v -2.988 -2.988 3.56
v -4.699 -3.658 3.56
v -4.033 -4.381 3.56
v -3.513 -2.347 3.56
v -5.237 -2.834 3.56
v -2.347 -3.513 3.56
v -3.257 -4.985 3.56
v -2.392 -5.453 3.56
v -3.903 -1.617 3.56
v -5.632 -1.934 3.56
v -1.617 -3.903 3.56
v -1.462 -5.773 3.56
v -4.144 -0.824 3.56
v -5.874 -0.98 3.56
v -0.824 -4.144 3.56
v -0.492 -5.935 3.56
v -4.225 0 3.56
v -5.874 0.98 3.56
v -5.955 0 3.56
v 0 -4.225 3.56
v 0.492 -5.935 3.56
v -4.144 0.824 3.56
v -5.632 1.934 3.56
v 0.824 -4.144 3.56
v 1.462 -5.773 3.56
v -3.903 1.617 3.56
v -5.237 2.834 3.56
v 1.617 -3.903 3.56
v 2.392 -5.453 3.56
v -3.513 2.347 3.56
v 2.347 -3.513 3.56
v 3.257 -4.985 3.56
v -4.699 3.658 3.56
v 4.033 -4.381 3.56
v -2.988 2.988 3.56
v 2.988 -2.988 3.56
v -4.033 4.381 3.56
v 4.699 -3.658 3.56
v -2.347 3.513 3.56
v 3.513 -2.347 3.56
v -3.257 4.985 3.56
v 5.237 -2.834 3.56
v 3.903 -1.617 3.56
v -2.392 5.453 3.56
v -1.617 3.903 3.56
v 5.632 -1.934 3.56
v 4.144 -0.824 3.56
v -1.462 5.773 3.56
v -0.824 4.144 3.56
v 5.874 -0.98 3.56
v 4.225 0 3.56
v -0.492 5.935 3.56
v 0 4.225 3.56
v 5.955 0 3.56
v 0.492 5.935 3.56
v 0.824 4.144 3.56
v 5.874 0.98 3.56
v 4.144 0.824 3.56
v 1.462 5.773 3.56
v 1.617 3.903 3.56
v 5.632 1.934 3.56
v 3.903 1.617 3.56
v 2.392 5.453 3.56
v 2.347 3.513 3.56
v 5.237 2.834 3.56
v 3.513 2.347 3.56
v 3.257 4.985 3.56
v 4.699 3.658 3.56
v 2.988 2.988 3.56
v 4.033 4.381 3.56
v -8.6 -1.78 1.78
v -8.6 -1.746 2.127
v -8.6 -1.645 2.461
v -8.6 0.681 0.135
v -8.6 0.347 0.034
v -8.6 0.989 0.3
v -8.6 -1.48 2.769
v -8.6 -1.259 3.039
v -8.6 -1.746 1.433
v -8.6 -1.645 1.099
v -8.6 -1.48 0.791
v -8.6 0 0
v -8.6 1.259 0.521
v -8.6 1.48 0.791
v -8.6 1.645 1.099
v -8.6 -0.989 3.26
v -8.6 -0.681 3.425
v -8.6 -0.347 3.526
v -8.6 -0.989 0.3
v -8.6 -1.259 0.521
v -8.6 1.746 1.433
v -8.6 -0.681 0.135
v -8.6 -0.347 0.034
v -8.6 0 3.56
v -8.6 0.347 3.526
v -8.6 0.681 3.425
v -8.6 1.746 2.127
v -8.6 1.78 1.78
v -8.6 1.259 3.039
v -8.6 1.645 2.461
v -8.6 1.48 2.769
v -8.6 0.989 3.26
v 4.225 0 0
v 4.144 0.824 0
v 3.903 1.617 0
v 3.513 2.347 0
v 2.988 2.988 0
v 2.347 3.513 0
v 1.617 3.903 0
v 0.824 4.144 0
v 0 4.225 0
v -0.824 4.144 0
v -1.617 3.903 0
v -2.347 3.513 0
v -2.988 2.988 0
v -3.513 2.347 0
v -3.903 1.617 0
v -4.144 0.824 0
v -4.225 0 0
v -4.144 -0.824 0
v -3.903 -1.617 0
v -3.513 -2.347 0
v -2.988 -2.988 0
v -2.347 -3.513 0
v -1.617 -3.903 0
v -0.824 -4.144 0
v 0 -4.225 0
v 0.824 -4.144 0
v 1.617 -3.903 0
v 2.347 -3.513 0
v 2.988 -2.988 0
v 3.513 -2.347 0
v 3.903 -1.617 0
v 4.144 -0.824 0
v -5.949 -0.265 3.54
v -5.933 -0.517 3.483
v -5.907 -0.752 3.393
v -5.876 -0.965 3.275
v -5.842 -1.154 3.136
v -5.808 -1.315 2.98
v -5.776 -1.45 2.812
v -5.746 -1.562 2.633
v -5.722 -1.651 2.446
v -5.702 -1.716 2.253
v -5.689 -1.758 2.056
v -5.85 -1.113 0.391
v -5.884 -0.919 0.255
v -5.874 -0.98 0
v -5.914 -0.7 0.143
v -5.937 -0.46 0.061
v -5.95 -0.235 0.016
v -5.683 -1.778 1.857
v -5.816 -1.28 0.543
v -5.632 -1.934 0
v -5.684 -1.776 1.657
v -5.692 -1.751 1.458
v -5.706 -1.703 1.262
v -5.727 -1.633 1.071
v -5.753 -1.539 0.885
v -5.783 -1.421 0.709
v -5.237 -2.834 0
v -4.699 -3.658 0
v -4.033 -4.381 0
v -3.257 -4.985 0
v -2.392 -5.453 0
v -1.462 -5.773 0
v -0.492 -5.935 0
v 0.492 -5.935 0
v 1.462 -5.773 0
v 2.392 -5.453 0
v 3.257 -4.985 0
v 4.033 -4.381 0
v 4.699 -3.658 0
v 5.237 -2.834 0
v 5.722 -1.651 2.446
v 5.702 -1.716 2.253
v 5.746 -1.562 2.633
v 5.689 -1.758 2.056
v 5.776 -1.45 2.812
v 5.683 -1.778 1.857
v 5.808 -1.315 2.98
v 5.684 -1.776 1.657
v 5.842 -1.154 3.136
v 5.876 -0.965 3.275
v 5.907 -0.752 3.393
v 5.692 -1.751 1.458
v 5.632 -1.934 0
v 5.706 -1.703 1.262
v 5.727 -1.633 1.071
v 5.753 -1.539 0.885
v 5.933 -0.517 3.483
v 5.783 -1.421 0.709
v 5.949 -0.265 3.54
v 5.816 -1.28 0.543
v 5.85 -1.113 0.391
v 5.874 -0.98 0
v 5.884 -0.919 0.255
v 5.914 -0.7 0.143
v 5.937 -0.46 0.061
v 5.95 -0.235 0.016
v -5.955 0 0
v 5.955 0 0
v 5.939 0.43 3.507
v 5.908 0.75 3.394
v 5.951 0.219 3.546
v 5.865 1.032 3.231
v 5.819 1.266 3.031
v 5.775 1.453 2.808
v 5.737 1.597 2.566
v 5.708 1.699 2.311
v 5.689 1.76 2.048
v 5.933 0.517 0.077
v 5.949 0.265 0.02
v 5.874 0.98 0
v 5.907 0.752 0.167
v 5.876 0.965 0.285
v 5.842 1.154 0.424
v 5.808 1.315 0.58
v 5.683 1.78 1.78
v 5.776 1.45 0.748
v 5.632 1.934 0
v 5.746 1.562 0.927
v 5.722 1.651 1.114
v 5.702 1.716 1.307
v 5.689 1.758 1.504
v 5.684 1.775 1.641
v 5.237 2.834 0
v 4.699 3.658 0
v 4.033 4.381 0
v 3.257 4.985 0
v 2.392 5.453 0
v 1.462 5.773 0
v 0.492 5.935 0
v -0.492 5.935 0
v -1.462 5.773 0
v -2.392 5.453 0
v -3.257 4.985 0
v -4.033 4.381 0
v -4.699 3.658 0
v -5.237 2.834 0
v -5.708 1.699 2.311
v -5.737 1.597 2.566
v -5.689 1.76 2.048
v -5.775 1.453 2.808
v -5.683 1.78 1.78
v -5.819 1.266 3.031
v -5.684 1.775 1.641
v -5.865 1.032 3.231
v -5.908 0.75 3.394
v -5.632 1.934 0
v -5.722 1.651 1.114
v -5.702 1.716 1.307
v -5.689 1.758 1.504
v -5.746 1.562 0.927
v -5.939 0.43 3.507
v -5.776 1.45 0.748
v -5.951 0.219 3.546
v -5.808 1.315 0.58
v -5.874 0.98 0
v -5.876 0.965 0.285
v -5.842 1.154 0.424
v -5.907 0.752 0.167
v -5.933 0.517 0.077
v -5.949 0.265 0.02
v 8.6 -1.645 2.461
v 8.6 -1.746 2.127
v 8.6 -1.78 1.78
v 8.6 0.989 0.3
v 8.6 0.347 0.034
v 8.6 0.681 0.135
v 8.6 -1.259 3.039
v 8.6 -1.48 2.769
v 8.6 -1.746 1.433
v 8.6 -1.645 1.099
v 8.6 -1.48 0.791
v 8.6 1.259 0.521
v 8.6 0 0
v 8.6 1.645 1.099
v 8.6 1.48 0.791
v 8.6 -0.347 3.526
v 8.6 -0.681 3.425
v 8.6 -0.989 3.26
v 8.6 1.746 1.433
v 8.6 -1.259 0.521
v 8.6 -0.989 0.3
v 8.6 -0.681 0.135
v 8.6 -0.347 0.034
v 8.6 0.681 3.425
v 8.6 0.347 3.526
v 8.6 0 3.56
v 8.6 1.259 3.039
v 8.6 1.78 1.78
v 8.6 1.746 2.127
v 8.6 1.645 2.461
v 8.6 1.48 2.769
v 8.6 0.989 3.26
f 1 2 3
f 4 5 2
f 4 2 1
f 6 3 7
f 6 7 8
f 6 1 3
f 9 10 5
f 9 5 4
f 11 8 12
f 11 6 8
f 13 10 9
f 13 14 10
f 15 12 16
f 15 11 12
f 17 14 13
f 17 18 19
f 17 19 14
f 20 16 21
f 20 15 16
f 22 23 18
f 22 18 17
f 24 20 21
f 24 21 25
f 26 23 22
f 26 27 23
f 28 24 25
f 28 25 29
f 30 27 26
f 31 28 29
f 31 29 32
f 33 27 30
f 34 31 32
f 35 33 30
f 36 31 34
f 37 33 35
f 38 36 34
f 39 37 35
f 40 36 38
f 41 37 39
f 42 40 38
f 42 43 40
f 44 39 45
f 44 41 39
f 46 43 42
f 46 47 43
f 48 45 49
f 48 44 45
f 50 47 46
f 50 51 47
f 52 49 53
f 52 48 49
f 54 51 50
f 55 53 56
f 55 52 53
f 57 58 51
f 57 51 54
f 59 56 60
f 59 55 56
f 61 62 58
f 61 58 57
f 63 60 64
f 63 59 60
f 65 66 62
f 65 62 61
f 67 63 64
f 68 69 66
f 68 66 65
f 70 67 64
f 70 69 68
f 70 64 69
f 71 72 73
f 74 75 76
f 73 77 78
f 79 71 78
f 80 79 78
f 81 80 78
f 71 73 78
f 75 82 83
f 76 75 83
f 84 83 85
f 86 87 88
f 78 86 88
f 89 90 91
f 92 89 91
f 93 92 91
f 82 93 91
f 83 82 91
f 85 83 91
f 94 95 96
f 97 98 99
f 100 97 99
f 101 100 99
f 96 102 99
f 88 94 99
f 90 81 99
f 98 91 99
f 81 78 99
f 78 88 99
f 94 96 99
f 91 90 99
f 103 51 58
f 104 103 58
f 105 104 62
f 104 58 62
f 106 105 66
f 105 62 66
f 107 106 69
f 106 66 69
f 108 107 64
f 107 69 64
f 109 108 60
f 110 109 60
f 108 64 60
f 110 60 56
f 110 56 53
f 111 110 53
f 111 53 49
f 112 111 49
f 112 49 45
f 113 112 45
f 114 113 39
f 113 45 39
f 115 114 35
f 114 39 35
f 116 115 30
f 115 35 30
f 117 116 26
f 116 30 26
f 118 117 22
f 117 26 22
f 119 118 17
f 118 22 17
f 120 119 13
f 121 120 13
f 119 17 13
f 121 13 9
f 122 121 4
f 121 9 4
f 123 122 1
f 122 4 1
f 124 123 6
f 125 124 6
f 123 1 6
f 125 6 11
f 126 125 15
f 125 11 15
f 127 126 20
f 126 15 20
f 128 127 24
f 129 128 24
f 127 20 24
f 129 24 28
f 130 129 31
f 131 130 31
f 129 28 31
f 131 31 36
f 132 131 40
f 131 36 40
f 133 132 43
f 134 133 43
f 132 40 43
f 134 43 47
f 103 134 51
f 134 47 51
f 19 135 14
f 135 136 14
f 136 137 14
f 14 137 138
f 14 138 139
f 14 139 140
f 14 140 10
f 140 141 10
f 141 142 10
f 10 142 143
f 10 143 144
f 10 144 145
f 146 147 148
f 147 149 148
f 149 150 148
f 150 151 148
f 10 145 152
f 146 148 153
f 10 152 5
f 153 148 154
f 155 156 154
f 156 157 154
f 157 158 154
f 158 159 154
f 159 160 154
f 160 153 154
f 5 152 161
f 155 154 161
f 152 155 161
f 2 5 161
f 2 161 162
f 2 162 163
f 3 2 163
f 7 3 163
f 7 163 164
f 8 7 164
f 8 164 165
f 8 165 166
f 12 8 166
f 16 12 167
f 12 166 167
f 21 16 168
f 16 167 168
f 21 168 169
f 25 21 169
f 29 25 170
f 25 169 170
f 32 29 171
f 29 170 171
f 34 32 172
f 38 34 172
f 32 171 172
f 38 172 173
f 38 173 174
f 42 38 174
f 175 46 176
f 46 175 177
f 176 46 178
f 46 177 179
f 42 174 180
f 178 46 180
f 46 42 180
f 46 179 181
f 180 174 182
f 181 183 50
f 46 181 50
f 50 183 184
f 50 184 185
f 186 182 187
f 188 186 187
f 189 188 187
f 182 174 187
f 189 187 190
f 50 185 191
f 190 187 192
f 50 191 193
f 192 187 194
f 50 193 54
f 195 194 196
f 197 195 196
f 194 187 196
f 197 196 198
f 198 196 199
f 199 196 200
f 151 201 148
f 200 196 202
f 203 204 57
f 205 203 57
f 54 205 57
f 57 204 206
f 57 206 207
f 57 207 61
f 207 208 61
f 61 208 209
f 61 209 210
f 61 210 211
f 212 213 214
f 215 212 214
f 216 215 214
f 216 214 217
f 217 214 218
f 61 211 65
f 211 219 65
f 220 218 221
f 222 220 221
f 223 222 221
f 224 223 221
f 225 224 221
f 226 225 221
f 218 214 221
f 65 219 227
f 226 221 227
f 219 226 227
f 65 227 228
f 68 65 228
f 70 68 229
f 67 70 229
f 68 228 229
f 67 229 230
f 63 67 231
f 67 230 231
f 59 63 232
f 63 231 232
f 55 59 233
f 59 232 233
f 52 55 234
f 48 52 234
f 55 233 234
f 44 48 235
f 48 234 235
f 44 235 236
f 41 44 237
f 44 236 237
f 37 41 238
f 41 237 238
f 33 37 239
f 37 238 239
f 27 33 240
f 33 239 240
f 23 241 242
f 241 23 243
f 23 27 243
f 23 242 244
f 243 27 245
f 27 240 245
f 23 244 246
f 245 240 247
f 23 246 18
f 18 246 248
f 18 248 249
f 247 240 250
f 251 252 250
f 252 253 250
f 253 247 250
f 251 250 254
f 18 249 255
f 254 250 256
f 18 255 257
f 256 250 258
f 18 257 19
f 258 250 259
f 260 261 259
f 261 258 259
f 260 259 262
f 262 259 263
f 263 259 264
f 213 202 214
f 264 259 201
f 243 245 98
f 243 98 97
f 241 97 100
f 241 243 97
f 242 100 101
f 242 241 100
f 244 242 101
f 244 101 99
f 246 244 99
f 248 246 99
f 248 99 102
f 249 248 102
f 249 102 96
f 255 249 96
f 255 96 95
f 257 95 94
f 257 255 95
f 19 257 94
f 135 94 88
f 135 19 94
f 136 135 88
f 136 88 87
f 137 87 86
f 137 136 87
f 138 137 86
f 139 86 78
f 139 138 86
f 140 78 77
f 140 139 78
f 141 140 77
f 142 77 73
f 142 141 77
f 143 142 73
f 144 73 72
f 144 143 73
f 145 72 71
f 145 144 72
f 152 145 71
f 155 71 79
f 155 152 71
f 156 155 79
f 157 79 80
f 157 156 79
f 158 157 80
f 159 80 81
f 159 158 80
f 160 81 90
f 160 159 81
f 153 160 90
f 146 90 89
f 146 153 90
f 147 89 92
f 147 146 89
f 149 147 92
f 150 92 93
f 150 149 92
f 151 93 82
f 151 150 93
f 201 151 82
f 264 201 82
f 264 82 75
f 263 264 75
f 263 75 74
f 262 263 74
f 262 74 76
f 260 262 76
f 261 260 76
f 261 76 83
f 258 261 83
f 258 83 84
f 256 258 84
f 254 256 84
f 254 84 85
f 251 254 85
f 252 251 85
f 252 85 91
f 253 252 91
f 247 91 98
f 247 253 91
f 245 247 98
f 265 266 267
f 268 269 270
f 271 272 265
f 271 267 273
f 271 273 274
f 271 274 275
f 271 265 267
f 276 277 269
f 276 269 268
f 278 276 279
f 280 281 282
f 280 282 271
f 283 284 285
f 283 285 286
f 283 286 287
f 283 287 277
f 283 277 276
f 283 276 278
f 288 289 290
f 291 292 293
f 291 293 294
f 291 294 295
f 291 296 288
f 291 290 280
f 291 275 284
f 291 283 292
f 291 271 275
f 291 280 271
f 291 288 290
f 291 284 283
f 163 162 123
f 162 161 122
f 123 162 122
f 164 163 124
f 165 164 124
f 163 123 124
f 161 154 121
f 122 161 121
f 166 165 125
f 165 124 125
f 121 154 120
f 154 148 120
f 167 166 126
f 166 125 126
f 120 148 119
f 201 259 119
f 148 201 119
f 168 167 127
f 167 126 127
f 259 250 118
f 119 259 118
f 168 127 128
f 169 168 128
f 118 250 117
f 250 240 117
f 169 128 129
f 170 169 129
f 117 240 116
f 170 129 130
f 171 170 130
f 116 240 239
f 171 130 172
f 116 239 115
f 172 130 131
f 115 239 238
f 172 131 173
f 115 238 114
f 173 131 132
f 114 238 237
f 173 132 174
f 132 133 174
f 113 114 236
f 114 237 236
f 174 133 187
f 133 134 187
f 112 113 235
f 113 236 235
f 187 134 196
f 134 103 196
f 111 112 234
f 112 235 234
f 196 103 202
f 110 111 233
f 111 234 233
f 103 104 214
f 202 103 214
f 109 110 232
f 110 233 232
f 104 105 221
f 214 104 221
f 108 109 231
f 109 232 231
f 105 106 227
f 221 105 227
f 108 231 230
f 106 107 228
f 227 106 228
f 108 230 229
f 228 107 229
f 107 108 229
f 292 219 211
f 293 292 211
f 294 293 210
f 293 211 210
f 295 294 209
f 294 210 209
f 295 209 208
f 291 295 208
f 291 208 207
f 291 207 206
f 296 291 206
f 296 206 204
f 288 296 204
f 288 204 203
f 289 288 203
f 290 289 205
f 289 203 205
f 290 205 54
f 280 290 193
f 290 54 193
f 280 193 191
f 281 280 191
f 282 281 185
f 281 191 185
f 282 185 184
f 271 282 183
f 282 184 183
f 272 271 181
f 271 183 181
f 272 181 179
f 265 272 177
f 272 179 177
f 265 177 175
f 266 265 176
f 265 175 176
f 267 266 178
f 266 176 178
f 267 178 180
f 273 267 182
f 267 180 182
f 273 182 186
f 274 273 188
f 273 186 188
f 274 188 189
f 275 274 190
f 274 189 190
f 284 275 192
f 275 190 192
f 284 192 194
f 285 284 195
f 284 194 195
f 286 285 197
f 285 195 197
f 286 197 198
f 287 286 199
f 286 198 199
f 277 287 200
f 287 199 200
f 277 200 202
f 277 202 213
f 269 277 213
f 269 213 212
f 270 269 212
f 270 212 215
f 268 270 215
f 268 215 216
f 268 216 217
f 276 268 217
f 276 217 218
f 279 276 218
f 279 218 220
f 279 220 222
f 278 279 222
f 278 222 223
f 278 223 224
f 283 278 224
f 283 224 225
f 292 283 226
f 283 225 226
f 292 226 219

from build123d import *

# Parameters (mm, degrees)
F0_R          = 1.78
F1_DEPTH      = 8.6
F1_DEPTH_BACK = 8.6
F2_R          = 5.955
F3_DEPTH      = 3.56
F4_R          = 4.225
F5_DEPTH      = 3.56


with BuildPart() as f1:
    # F0 (on Right) → F1 (new body, two sides)
    with BuildSketch(Plane.YZ) as f1_sk:
        with Locations((0, 1.78)):
            Circle(F0_R)
    extrude(amount=-F1_DEPTH)
    extrude(f1_sk.sketch, amount=F1_DEPTH_BACK)

    # F2 (on Top) → F3 (join)
    with BuildSketch(Plane.XY):
        Circle(F2_R)
    extrude(amount=F3_DEPTH)

    # F4 (on face) → F5 (cut)
    with BuildSketch(Plane.XY.offset(3.56)):
        Circle(F4_R)
    extrude(amount=-F5_DEPTH, mode=Mode.SUBTRACT)


solid = f1.part
